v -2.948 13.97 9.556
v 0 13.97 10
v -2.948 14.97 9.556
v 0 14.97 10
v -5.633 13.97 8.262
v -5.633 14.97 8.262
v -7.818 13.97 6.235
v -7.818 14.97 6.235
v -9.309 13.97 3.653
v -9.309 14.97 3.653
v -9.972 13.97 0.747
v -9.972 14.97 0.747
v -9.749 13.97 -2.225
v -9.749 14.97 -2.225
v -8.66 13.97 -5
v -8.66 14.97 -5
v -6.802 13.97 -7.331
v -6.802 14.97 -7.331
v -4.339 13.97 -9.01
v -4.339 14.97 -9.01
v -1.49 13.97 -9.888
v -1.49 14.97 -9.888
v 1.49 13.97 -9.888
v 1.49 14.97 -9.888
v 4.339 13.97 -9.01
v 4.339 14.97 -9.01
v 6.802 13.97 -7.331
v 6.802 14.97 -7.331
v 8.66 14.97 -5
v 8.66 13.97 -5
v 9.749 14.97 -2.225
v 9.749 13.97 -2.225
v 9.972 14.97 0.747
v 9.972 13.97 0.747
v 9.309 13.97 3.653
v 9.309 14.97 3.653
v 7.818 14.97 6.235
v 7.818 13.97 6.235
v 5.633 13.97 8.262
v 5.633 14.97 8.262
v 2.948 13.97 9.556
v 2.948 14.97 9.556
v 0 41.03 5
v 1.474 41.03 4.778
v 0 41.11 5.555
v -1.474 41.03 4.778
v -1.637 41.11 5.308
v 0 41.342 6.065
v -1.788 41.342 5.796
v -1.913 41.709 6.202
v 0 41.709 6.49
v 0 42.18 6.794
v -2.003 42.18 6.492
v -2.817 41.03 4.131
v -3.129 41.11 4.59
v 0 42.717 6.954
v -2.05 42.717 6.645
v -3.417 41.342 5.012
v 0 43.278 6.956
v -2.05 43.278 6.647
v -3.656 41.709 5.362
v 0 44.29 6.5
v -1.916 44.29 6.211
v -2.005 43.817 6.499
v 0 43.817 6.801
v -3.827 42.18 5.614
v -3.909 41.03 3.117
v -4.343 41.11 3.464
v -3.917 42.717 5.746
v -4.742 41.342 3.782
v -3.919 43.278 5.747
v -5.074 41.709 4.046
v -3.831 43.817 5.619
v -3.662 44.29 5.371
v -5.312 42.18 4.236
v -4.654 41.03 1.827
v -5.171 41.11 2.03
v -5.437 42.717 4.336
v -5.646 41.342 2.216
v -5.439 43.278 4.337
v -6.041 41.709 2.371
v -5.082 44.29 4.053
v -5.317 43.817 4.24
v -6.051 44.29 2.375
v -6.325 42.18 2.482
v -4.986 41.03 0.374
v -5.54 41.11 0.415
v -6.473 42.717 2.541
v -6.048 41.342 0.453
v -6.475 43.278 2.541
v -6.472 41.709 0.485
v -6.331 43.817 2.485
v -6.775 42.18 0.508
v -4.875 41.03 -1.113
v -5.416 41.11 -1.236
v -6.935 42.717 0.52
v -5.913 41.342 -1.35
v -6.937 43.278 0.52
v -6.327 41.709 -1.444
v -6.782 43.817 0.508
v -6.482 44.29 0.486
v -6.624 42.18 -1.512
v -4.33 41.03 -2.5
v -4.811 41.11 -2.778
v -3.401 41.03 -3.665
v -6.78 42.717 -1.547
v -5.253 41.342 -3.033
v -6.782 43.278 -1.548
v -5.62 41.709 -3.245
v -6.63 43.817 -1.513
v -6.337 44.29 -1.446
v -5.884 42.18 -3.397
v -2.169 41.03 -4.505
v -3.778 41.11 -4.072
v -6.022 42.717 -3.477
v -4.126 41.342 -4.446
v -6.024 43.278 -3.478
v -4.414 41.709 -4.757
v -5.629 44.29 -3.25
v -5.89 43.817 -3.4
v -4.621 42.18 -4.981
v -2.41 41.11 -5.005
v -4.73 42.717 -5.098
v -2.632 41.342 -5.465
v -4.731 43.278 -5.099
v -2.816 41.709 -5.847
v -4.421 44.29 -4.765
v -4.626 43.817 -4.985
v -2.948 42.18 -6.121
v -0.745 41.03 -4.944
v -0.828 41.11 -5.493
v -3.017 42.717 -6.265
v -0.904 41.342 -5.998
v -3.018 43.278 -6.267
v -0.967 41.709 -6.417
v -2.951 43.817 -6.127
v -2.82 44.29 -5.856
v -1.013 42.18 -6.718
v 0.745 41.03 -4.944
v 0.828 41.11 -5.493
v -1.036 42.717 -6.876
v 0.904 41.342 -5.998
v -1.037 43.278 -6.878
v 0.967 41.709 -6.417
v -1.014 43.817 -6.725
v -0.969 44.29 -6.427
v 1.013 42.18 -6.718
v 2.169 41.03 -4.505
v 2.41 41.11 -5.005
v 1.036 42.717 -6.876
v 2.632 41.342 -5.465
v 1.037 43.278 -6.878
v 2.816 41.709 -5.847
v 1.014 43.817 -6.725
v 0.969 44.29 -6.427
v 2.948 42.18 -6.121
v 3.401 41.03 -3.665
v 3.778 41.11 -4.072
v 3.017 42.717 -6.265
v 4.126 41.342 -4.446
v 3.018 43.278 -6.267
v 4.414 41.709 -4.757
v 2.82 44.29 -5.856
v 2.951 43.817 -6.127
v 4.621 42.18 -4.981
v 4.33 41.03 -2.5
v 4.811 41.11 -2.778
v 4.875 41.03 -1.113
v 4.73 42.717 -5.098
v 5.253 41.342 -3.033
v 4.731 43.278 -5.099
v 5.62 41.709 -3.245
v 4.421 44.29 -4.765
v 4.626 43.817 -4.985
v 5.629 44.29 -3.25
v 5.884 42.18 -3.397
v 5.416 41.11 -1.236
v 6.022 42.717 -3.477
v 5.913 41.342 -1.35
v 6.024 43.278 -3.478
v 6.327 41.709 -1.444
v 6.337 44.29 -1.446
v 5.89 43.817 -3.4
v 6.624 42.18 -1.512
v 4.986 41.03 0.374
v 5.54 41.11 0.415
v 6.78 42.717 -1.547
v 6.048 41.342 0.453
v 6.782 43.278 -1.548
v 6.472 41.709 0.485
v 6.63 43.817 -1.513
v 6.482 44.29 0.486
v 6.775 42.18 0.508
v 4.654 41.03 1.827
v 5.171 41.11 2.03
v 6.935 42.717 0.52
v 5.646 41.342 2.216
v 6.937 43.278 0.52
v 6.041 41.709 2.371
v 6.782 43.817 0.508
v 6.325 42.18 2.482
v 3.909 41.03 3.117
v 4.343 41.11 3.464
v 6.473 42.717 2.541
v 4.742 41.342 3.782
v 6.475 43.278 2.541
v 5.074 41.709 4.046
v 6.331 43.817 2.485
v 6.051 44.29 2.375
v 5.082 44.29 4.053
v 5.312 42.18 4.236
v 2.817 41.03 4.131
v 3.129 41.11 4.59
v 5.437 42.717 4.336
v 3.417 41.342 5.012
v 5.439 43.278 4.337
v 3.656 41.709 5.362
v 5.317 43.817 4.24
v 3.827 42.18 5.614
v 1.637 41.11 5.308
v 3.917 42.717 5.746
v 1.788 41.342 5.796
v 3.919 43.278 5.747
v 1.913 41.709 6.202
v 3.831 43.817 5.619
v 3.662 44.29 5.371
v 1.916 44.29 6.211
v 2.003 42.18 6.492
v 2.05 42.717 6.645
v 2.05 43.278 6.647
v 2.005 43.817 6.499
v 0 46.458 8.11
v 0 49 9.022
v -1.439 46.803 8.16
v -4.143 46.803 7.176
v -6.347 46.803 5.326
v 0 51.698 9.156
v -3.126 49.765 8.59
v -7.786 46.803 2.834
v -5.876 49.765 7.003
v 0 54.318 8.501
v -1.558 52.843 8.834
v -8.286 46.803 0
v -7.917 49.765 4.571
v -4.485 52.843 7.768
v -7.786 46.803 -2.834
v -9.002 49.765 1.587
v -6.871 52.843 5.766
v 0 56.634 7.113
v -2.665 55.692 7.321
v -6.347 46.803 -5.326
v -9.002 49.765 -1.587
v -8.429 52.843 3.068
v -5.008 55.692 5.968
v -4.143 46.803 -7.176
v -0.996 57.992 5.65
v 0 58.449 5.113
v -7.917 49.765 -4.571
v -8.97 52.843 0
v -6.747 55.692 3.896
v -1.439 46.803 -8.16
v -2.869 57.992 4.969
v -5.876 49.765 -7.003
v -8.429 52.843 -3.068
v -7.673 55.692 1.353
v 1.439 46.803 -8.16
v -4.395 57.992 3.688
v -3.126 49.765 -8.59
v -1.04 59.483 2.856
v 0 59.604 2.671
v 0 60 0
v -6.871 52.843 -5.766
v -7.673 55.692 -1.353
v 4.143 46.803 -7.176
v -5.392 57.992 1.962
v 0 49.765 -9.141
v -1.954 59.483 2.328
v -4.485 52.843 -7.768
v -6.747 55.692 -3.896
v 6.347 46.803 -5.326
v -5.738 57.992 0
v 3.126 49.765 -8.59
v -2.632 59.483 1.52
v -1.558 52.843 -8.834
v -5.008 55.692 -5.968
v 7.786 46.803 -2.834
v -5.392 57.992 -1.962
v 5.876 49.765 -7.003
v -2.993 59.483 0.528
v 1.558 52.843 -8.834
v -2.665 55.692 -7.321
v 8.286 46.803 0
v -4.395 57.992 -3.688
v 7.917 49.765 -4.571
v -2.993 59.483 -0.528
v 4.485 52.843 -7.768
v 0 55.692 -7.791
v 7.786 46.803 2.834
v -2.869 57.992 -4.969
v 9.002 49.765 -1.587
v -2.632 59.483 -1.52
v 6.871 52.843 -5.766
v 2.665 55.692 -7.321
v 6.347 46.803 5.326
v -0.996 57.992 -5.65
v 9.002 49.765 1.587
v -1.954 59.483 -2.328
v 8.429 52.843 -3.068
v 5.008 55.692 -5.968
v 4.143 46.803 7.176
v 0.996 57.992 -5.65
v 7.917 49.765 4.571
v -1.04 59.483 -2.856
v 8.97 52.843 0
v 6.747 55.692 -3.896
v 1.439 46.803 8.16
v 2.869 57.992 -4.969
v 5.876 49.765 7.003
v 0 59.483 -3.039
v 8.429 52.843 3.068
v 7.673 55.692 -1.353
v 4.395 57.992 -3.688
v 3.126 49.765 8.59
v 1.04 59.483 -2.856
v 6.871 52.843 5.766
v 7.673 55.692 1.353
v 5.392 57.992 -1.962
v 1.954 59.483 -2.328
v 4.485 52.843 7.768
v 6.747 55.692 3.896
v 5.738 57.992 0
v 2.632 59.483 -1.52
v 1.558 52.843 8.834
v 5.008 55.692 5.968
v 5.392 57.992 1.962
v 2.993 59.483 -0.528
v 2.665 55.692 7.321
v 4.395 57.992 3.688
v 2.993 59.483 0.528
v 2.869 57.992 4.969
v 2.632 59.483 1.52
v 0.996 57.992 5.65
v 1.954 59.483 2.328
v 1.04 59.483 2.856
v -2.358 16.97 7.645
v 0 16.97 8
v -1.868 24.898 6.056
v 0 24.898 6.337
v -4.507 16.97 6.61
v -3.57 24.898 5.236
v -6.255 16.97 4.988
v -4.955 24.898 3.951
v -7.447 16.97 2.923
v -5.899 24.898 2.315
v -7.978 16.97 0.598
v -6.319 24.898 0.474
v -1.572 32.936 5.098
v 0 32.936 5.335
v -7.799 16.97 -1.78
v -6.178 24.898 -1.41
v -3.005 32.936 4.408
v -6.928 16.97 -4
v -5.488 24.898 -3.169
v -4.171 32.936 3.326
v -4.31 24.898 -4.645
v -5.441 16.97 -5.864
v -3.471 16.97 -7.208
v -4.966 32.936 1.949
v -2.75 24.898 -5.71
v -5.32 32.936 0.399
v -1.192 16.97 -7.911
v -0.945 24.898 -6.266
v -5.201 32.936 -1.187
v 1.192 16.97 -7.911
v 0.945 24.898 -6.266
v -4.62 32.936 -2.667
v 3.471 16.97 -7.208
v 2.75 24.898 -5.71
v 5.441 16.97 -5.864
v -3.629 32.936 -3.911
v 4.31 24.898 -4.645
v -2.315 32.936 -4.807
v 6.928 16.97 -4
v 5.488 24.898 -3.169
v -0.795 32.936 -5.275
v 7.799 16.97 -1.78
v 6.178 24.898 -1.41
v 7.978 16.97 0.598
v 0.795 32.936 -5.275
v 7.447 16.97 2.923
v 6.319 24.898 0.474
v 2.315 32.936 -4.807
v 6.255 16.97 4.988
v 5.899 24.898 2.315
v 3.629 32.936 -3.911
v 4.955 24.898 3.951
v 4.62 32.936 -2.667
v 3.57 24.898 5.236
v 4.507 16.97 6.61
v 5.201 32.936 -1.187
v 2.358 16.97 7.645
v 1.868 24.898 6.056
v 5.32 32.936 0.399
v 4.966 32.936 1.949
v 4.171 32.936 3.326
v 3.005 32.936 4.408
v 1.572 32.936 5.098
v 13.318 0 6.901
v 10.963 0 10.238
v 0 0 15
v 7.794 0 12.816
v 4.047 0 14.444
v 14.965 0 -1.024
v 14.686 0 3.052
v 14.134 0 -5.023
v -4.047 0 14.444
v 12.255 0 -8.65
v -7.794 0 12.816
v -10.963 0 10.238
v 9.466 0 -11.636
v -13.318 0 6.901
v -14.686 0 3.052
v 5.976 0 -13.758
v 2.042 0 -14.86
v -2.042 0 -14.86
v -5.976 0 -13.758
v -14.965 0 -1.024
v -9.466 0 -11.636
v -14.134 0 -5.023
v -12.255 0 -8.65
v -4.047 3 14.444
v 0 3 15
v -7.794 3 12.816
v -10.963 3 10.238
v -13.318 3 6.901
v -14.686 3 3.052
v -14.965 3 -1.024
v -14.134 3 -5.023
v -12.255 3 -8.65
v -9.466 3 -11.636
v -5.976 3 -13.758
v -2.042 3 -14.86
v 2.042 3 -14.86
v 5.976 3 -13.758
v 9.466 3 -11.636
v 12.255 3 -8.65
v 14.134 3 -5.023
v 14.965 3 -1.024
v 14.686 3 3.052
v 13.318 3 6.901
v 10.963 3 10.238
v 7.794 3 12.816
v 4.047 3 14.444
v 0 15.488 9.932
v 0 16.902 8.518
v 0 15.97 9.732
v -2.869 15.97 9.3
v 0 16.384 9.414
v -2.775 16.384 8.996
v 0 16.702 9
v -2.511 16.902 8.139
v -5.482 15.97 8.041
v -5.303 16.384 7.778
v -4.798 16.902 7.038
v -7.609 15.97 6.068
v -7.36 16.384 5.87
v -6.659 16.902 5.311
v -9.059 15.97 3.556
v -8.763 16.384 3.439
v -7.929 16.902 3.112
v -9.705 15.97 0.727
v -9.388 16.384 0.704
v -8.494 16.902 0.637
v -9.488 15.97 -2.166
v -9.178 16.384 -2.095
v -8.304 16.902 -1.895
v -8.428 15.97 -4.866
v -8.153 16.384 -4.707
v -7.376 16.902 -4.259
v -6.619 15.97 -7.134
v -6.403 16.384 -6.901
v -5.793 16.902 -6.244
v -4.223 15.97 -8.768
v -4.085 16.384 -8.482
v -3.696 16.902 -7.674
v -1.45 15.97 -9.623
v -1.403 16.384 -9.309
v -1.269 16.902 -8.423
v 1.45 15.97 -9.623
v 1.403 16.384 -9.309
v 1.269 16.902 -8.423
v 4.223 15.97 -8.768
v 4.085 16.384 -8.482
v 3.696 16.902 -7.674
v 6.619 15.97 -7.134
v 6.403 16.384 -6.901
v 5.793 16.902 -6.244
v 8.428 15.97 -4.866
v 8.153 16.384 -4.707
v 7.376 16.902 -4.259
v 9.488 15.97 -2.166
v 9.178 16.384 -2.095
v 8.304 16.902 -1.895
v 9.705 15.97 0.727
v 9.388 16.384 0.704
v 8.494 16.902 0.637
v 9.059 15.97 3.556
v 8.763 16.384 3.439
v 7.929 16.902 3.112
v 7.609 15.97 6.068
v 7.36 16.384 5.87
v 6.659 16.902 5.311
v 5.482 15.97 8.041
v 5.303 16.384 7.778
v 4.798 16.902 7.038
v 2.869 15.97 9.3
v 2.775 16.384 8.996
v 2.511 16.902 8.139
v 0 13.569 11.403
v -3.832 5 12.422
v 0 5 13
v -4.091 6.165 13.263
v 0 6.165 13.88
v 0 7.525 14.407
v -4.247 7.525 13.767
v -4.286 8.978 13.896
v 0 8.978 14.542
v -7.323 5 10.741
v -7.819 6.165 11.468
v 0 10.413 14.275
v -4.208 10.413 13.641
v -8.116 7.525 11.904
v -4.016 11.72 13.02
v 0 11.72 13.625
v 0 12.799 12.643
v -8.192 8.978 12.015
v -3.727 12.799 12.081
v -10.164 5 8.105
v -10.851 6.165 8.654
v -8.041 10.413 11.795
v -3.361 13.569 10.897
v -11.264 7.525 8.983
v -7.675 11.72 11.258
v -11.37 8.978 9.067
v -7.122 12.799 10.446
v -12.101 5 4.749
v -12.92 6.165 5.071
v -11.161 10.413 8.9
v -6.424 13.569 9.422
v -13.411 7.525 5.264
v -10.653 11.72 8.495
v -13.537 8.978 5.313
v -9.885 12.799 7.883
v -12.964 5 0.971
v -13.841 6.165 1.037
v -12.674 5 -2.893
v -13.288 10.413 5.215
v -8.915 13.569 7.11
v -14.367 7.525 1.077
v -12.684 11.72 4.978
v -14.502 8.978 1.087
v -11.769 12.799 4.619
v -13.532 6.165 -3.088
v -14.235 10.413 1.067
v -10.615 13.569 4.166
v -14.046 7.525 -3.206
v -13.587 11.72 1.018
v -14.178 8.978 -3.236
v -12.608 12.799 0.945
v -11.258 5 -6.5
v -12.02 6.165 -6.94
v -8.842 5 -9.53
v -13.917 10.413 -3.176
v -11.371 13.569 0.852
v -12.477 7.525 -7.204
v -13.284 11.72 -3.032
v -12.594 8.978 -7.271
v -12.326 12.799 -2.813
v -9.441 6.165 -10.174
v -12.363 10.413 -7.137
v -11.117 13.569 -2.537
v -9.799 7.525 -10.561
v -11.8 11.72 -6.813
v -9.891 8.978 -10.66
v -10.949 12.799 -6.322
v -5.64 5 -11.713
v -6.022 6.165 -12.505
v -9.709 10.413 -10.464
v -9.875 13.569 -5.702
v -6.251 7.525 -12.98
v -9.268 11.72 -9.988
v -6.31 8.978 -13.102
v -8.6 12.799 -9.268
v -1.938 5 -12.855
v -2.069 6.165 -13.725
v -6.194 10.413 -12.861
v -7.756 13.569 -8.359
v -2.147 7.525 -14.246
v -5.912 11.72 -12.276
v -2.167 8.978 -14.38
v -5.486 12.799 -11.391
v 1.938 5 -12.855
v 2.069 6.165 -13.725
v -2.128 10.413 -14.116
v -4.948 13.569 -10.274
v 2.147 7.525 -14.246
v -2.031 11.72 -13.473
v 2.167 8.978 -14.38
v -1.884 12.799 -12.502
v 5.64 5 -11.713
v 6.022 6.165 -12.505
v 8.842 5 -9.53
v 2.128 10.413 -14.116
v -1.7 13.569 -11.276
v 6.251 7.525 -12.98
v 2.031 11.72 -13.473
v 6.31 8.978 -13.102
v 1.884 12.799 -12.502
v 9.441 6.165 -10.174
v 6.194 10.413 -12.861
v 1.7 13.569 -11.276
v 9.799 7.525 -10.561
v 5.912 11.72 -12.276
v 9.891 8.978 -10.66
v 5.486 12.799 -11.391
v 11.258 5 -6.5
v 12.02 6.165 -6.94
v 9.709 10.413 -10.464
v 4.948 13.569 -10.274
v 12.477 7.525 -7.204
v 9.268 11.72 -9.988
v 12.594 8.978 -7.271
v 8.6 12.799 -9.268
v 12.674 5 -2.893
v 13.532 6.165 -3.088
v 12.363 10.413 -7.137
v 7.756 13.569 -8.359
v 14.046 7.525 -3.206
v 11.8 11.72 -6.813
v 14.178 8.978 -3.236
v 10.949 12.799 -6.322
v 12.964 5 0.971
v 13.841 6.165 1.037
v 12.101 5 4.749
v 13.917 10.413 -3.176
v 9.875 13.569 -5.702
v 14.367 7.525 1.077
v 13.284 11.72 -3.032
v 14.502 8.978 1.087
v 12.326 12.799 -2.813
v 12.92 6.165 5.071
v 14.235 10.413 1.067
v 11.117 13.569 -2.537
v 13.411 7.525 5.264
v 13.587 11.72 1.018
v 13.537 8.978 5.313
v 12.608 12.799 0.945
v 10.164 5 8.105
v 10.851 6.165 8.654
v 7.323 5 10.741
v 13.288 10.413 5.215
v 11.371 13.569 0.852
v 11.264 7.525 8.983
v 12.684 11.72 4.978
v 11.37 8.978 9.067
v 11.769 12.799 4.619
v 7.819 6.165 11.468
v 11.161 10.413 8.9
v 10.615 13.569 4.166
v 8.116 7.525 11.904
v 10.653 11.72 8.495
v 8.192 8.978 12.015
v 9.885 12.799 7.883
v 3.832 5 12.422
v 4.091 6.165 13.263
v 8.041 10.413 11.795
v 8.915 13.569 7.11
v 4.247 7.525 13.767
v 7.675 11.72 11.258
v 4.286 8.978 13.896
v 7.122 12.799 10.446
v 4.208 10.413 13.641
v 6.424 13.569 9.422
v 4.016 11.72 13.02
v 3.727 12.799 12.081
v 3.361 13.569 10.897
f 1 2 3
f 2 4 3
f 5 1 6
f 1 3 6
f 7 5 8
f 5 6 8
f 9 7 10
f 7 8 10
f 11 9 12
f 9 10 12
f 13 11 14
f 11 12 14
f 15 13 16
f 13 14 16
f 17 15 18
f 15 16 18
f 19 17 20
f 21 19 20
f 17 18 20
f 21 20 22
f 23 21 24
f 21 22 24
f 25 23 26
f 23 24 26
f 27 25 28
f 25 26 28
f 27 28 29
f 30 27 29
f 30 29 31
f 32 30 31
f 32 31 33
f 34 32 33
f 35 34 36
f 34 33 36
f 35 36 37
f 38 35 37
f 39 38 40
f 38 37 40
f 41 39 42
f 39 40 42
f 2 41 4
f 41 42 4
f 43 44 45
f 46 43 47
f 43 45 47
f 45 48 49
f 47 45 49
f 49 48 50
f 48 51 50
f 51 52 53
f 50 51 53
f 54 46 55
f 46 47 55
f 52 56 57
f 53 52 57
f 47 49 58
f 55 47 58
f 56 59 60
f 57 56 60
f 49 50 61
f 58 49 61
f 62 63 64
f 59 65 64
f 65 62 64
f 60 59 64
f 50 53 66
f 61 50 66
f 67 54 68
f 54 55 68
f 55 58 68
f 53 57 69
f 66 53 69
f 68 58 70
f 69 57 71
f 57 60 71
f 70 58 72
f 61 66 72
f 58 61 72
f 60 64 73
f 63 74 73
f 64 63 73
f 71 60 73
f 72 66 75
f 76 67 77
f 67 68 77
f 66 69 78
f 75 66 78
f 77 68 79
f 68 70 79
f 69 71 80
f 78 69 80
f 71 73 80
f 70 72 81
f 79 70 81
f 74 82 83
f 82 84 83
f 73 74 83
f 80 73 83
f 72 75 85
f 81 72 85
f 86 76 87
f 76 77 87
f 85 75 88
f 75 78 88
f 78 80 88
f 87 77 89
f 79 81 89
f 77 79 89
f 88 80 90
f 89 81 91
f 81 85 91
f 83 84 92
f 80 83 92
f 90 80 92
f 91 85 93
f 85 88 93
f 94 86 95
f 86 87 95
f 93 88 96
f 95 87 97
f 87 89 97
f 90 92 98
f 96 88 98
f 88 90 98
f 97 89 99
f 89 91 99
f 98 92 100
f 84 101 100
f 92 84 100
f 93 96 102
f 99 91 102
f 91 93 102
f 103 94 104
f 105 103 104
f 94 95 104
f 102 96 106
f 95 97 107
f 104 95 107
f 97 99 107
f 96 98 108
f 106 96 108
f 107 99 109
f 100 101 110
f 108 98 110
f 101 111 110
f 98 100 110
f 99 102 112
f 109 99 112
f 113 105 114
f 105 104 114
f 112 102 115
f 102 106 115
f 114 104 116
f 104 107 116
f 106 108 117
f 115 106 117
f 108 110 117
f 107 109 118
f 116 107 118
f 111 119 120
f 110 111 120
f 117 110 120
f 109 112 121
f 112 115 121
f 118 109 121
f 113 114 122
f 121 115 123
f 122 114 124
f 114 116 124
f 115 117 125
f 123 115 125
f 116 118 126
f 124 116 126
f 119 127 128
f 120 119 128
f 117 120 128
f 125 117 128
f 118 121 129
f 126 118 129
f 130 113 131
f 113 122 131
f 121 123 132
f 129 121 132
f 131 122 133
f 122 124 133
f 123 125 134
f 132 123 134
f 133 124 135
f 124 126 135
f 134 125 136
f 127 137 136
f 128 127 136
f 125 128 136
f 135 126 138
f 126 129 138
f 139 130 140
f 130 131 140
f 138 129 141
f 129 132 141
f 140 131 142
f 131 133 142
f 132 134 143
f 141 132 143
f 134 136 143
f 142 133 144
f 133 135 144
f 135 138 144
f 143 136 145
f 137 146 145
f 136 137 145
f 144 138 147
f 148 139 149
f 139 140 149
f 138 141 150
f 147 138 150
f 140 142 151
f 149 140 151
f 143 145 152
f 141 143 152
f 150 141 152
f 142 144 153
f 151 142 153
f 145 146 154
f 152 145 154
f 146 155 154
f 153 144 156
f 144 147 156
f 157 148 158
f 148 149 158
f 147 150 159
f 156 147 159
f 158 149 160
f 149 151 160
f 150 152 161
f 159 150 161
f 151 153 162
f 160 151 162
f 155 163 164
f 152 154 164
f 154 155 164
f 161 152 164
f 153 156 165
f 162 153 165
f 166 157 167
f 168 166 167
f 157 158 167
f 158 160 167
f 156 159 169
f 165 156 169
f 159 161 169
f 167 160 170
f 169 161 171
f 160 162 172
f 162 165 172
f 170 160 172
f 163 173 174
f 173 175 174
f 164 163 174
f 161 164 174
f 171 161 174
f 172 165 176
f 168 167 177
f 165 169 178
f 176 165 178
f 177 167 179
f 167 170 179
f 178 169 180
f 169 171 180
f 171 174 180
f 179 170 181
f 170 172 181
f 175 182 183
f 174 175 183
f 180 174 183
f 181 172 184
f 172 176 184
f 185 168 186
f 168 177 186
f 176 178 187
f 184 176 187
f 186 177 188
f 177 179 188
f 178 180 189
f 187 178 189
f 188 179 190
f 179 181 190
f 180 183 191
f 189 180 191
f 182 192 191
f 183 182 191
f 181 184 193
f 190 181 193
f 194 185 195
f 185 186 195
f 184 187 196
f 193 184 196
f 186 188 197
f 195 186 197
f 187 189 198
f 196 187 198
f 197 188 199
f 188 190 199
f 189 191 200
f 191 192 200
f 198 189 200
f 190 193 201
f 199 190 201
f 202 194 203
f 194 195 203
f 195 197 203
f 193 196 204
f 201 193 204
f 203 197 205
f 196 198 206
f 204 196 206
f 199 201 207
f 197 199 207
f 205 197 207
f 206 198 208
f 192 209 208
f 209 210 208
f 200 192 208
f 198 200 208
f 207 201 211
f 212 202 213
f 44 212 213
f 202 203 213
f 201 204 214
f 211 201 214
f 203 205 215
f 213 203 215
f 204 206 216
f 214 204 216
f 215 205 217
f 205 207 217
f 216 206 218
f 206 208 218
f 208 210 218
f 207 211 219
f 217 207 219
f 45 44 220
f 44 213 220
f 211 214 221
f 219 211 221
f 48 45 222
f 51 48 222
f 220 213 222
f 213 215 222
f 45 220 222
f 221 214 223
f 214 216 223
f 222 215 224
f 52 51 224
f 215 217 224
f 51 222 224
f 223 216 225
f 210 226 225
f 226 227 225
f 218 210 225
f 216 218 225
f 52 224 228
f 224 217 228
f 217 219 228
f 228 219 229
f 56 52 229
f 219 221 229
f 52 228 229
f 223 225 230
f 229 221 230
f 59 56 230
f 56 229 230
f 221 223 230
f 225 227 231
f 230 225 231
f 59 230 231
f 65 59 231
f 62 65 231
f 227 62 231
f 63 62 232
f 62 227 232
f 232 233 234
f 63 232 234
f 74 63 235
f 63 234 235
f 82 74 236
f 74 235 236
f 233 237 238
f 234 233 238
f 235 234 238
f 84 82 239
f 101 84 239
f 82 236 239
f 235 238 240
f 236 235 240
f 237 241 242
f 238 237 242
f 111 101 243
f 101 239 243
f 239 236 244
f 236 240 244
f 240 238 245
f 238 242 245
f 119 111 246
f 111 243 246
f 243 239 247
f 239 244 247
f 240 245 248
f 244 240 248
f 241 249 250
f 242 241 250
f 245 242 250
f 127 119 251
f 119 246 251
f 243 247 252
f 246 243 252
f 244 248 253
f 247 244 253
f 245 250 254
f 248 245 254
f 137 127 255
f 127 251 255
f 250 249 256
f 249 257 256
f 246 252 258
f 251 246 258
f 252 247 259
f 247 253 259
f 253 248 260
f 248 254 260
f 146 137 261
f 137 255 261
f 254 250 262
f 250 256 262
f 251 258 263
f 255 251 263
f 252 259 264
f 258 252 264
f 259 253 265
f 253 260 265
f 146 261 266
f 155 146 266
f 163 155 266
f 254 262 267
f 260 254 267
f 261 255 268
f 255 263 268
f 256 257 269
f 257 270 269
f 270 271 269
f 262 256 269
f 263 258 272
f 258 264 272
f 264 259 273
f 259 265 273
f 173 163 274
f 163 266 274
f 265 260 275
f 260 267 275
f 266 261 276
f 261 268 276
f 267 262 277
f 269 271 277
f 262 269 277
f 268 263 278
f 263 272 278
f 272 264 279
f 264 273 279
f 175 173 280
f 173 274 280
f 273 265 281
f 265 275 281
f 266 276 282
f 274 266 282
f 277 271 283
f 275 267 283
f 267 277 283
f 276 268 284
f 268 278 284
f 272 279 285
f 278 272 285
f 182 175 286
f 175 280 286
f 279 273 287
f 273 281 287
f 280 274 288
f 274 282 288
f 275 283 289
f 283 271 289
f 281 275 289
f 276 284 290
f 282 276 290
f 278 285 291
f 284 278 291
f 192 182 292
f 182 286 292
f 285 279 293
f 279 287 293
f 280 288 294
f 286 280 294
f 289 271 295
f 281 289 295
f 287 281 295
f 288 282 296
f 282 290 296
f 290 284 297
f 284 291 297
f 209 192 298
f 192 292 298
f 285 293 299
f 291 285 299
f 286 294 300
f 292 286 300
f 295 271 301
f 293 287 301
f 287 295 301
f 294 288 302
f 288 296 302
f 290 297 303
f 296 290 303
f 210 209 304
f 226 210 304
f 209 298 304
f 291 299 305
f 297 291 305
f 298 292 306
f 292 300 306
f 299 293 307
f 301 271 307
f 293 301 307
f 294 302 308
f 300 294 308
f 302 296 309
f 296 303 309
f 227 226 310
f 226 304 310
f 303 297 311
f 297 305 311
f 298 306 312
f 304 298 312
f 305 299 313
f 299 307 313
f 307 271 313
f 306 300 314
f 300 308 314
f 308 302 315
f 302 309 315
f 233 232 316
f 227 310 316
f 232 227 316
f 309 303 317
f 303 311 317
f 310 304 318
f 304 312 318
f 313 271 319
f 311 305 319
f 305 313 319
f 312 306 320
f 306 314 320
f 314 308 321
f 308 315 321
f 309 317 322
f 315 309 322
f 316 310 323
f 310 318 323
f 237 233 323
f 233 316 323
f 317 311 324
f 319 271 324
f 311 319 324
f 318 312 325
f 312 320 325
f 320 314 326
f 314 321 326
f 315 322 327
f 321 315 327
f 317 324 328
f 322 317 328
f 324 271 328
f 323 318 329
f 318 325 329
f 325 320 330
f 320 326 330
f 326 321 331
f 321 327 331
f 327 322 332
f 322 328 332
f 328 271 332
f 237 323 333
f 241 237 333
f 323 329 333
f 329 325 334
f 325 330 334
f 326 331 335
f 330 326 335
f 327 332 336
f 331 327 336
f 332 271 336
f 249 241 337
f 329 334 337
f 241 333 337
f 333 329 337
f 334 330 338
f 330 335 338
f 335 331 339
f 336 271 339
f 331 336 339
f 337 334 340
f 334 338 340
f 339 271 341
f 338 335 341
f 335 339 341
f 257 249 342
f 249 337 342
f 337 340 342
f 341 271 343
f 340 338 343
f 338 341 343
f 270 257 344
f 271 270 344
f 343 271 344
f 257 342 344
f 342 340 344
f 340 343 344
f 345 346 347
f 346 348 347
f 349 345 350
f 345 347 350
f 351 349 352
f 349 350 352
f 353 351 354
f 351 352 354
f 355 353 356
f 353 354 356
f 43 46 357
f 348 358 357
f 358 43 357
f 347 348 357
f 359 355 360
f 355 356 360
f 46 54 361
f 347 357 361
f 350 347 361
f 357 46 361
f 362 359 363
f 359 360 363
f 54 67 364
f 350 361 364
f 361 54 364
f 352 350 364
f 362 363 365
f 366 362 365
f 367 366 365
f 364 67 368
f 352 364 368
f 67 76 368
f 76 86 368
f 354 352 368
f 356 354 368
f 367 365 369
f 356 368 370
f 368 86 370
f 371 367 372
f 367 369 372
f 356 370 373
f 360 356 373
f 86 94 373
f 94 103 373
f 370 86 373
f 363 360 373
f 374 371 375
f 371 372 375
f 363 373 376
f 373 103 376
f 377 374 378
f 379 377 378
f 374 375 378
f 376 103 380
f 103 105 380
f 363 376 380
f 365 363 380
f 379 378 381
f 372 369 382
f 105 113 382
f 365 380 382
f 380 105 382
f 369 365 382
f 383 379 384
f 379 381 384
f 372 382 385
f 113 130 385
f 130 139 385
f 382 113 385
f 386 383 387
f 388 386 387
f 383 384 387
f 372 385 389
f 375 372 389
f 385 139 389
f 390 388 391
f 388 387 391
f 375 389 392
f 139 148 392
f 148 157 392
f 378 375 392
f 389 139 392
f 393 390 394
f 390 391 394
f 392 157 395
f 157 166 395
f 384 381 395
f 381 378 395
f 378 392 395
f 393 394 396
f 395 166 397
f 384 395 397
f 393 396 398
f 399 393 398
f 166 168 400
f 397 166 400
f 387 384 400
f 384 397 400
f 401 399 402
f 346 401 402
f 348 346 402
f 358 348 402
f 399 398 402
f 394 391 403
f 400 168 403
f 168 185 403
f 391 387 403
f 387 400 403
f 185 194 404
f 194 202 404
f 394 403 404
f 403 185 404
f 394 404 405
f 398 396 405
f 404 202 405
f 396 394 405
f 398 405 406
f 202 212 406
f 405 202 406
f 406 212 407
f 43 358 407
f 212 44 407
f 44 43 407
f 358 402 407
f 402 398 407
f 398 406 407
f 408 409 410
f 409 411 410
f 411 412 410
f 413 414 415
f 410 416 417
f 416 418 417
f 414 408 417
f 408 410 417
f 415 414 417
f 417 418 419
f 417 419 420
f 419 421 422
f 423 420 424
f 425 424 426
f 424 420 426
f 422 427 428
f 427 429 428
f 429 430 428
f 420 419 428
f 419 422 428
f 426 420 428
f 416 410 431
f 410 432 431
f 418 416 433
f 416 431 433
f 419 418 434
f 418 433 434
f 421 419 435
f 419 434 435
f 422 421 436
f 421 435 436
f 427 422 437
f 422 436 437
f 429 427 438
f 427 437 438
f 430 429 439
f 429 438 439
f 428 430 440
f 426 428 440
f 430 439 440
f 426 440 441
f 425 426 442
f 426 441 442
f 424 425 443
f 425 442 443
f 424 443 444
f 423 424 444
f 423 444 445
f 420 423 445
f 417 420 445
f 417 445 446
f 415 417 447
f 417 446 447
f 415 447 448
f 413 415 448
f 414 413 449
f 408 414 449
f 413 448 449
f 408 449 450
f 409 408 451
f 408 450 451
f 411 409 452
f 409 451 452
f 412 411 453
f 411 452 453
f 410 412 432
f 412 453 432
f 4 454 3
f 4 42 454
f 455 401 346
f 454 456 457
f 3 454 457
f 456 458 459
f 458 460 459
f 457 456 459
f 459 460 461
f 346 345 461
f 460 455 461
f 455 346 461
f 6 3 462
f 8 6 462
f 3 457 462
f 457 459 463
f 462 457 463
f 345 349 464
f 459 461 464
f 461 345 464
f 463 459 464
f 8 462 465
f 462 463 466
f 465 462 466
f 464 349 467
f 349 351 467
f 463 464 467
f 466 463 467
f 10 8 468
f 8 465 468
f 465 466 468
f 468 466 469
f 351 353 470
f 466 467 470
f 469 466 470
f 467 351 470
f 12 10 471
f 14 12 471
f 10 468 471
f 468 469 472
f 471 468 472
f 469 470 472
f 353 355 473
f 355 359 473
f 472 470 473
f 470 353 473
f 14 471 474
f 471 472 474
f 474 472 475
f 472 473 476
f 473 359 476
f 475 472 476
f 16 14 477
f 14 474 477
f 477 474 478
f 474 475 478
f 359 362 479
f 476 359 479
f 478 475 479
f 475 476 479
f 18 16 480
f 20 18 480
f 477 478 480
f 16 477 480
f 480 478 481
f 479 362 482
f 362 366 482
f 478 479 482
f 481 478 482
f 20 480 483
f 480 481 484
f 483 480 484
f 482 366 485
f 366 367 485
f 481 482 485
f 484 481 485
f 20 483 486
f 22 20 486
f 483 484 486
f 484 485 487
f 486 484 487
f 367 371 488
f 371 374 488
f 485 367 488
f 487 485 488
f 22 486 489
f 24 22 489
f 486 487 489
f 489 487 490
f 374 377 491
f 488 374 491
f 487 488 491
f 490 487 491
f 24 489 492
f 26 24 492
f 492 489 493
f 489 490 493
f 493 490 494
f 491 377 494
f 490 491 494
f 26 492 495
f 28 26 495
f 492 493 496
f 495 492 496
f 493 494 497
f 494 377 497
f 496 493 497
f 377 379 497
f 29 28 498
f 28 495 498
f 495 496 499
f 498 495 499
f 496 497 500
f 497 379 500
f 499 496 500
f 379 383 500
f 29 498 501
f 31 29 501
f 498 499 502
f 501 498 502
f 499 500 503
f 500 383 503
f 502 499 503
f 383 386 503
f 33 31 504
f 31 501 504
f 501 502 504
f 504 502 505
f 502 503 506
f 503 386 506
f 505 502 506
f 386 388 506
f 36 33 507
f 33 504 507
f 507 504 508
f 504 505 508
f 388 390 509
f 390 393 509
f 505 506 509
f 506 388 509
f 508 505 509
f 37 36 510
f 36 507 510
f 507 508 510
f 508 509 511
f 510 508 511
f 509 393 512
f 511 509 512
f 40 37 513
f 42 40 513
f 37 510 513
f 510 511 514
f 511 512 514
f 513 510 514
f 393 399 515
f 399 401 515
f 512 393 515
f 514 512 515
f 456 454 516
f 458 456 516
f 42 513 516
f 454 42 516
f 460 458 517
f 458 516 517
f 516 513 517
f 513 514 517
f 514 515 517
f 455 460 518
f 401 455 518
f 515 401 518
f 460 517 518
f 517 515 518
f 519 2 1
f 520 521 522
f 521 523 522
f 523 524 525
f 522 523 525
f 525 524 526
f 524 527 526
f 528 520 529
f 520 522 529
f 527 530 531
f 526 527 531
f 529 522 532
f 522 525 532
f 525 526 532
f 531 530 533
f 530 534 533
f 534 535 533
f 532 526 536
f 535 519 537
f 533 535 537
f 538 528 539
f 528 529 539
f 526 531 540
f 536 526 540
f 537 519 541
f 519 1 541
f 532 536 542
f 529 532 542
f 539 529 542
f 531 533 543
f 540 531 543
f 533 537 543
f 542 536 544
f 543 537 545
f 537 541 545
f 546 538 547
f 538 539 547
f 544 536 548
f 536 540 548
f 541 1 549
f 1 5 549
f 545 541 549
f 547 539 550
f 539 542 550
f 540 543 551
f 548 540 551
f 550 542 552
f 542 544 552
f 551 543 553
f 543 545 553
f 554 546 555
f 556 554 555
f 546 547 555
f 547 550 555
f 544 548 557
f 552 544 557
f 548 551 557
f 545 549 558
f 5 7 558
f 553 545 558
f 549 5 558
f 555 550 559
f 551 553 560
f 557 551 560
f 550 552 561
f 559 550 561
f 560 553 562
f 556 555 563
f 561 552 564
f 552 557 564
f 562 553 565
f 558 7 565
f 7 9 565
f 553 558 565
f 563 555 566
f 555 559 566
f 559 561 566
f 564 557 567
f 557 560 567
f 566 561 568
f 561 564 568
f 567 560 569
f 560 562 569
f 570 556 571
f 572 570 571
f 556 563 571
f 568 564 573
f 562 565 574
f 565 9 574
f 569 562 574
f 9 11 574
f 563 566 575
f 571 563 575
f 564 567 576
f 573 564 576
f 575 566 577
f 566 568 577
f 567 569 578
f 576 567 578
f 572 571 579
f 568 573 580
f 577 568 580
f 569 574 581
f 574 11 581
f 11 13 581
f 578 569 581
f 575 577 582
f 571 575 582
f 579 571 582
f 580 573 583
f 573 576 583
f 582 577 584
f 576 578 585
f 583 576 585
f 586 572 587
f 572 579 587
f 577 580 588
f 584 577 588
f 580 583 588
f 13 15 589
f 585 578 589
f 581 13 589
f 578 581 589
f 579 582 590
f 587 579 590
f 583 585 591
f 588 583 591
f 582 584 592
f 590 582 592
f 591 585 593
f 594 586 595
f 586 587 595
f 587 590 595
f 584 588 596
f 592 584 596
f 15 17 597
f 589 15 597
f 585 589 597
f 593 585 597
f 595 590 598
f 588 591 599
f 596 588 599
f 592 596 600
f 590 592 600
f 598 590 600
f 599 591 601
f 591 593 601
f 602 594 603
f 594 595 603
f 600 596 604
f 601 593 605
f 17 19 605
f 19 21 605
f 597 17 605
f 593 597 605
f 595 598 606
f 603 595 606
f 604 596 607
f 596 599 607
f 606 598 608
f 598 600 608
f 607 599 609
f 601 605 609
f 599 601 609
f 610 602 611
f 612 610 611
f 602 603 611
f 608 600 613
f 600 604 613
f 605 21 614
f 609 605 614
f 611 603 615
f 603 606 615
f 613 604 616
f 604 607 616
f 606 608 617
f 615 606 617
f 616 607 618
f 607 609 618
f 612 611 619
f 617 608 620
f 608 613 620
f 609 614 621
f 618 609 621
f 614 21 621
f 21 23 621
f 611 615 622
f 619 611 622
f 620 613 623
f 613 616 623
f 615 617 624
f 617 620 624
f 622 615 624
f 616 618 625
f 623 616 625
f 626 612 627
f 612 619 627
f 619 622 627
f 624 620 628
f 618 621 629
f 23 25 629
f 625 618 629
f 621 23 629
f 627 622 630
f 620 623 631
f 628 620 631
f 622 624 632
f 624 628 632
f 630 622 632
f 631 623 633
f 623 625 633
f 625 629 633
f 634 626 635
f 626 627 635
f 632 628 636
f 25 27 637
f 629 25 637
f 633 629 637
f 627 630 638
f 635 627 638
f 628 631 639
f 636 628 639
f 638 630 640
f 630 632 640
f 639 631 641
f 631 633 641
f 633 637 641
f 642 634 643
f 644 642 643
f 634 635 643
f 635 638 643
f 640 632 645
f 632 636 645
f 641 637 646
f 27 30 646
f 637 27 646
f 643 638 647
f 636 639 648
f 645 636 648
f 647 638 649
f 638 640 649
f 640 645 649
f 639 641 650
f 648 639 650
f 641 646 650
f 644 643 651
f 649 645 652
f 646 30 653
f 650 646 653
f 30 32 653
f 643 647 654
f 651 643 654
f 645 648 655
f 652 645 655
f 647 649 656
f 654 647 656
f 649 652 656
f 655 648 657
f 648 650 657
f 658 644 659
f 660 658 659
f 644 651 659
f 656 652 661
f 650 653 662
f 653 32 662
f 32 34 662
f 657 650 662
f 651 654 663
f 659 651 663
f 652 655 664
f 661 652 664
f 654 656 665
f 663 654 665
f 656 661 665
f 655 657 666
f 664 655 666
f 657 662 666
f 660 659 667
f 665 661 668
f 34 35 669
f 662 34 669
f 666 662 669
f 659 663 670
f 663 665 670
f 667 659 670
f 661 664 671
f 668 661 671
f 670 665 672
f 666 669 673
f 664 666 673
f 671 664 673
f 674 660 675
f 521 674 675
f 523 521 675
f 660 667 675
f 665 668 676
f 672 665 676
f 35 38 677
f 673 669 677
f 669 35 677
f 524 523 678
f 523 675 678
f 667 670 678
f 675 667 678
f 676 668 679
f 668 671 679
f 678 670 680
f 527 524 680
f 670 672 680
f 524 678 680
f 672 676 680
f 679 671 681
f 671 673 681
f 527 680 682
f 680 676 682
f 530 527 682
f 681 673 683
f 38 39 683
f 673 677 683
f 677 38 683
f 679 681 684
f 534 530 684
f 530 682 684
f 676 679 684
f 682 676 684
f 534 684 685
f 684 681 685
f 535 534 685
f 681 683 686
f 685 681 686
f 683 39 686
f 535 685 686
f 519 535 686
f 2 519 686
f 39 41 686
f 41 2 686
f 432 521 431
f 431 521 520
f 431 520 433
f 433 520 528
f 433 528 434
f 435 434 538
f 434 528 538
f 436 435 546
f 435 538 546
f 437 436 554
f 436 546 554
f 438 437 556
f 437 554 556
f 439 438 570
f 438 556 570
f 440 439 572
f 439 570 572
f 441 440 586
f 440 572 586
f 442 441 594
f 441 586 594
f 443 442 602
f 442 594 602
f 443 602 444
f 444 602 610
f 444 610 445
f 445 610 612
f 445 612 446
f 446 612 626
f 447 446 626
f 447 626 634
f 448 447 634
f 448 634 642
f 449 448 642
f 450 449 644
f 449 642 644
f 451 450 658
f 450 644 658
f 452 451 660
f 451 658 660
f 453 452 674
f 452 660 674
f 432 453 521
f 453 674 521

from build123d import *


with BuildPart() as part:
    # Croquis1 → Revolución3 (revolve)
    with BuildSketch(Plane.XY, mode=Mode.PRIVATE) as revoluci_n3_sk:
        with BuildLine():
            Line((0, 0), (15, 0))
            Line((15, 0), (15, 3))
            Line((15, 3), (13, 5))
            ThreePointArc((13, 5), (14.274991786, 10.413090898), (10, 13.97))
            Line((10, 13.97), (10, 14.97))
            ThreePointArc((10, 14.97), (9.414213562, 16.384213562), (8, 16.97))
            ThreePointArc((8, 16.97), (5.752892651, 28.90684447), (5, 41.03))
            ThreePointArc((5, 41.03), (6.794268653, 42.179508288), (6.5, 44.29))
            ThreePointArc((6.5, 44.29), (8.500795551, 54.317512481), (0, 60))
            Line((0, 60), (0, 0))
        make_face()
    revolve(revoluci_n3_sk.sketch.rotate(Axis((0, 60, 0), (0, -1, 0)), 90), axis=Axis((0, 60, 0), (0, -1, 0)))


solid = part.part
